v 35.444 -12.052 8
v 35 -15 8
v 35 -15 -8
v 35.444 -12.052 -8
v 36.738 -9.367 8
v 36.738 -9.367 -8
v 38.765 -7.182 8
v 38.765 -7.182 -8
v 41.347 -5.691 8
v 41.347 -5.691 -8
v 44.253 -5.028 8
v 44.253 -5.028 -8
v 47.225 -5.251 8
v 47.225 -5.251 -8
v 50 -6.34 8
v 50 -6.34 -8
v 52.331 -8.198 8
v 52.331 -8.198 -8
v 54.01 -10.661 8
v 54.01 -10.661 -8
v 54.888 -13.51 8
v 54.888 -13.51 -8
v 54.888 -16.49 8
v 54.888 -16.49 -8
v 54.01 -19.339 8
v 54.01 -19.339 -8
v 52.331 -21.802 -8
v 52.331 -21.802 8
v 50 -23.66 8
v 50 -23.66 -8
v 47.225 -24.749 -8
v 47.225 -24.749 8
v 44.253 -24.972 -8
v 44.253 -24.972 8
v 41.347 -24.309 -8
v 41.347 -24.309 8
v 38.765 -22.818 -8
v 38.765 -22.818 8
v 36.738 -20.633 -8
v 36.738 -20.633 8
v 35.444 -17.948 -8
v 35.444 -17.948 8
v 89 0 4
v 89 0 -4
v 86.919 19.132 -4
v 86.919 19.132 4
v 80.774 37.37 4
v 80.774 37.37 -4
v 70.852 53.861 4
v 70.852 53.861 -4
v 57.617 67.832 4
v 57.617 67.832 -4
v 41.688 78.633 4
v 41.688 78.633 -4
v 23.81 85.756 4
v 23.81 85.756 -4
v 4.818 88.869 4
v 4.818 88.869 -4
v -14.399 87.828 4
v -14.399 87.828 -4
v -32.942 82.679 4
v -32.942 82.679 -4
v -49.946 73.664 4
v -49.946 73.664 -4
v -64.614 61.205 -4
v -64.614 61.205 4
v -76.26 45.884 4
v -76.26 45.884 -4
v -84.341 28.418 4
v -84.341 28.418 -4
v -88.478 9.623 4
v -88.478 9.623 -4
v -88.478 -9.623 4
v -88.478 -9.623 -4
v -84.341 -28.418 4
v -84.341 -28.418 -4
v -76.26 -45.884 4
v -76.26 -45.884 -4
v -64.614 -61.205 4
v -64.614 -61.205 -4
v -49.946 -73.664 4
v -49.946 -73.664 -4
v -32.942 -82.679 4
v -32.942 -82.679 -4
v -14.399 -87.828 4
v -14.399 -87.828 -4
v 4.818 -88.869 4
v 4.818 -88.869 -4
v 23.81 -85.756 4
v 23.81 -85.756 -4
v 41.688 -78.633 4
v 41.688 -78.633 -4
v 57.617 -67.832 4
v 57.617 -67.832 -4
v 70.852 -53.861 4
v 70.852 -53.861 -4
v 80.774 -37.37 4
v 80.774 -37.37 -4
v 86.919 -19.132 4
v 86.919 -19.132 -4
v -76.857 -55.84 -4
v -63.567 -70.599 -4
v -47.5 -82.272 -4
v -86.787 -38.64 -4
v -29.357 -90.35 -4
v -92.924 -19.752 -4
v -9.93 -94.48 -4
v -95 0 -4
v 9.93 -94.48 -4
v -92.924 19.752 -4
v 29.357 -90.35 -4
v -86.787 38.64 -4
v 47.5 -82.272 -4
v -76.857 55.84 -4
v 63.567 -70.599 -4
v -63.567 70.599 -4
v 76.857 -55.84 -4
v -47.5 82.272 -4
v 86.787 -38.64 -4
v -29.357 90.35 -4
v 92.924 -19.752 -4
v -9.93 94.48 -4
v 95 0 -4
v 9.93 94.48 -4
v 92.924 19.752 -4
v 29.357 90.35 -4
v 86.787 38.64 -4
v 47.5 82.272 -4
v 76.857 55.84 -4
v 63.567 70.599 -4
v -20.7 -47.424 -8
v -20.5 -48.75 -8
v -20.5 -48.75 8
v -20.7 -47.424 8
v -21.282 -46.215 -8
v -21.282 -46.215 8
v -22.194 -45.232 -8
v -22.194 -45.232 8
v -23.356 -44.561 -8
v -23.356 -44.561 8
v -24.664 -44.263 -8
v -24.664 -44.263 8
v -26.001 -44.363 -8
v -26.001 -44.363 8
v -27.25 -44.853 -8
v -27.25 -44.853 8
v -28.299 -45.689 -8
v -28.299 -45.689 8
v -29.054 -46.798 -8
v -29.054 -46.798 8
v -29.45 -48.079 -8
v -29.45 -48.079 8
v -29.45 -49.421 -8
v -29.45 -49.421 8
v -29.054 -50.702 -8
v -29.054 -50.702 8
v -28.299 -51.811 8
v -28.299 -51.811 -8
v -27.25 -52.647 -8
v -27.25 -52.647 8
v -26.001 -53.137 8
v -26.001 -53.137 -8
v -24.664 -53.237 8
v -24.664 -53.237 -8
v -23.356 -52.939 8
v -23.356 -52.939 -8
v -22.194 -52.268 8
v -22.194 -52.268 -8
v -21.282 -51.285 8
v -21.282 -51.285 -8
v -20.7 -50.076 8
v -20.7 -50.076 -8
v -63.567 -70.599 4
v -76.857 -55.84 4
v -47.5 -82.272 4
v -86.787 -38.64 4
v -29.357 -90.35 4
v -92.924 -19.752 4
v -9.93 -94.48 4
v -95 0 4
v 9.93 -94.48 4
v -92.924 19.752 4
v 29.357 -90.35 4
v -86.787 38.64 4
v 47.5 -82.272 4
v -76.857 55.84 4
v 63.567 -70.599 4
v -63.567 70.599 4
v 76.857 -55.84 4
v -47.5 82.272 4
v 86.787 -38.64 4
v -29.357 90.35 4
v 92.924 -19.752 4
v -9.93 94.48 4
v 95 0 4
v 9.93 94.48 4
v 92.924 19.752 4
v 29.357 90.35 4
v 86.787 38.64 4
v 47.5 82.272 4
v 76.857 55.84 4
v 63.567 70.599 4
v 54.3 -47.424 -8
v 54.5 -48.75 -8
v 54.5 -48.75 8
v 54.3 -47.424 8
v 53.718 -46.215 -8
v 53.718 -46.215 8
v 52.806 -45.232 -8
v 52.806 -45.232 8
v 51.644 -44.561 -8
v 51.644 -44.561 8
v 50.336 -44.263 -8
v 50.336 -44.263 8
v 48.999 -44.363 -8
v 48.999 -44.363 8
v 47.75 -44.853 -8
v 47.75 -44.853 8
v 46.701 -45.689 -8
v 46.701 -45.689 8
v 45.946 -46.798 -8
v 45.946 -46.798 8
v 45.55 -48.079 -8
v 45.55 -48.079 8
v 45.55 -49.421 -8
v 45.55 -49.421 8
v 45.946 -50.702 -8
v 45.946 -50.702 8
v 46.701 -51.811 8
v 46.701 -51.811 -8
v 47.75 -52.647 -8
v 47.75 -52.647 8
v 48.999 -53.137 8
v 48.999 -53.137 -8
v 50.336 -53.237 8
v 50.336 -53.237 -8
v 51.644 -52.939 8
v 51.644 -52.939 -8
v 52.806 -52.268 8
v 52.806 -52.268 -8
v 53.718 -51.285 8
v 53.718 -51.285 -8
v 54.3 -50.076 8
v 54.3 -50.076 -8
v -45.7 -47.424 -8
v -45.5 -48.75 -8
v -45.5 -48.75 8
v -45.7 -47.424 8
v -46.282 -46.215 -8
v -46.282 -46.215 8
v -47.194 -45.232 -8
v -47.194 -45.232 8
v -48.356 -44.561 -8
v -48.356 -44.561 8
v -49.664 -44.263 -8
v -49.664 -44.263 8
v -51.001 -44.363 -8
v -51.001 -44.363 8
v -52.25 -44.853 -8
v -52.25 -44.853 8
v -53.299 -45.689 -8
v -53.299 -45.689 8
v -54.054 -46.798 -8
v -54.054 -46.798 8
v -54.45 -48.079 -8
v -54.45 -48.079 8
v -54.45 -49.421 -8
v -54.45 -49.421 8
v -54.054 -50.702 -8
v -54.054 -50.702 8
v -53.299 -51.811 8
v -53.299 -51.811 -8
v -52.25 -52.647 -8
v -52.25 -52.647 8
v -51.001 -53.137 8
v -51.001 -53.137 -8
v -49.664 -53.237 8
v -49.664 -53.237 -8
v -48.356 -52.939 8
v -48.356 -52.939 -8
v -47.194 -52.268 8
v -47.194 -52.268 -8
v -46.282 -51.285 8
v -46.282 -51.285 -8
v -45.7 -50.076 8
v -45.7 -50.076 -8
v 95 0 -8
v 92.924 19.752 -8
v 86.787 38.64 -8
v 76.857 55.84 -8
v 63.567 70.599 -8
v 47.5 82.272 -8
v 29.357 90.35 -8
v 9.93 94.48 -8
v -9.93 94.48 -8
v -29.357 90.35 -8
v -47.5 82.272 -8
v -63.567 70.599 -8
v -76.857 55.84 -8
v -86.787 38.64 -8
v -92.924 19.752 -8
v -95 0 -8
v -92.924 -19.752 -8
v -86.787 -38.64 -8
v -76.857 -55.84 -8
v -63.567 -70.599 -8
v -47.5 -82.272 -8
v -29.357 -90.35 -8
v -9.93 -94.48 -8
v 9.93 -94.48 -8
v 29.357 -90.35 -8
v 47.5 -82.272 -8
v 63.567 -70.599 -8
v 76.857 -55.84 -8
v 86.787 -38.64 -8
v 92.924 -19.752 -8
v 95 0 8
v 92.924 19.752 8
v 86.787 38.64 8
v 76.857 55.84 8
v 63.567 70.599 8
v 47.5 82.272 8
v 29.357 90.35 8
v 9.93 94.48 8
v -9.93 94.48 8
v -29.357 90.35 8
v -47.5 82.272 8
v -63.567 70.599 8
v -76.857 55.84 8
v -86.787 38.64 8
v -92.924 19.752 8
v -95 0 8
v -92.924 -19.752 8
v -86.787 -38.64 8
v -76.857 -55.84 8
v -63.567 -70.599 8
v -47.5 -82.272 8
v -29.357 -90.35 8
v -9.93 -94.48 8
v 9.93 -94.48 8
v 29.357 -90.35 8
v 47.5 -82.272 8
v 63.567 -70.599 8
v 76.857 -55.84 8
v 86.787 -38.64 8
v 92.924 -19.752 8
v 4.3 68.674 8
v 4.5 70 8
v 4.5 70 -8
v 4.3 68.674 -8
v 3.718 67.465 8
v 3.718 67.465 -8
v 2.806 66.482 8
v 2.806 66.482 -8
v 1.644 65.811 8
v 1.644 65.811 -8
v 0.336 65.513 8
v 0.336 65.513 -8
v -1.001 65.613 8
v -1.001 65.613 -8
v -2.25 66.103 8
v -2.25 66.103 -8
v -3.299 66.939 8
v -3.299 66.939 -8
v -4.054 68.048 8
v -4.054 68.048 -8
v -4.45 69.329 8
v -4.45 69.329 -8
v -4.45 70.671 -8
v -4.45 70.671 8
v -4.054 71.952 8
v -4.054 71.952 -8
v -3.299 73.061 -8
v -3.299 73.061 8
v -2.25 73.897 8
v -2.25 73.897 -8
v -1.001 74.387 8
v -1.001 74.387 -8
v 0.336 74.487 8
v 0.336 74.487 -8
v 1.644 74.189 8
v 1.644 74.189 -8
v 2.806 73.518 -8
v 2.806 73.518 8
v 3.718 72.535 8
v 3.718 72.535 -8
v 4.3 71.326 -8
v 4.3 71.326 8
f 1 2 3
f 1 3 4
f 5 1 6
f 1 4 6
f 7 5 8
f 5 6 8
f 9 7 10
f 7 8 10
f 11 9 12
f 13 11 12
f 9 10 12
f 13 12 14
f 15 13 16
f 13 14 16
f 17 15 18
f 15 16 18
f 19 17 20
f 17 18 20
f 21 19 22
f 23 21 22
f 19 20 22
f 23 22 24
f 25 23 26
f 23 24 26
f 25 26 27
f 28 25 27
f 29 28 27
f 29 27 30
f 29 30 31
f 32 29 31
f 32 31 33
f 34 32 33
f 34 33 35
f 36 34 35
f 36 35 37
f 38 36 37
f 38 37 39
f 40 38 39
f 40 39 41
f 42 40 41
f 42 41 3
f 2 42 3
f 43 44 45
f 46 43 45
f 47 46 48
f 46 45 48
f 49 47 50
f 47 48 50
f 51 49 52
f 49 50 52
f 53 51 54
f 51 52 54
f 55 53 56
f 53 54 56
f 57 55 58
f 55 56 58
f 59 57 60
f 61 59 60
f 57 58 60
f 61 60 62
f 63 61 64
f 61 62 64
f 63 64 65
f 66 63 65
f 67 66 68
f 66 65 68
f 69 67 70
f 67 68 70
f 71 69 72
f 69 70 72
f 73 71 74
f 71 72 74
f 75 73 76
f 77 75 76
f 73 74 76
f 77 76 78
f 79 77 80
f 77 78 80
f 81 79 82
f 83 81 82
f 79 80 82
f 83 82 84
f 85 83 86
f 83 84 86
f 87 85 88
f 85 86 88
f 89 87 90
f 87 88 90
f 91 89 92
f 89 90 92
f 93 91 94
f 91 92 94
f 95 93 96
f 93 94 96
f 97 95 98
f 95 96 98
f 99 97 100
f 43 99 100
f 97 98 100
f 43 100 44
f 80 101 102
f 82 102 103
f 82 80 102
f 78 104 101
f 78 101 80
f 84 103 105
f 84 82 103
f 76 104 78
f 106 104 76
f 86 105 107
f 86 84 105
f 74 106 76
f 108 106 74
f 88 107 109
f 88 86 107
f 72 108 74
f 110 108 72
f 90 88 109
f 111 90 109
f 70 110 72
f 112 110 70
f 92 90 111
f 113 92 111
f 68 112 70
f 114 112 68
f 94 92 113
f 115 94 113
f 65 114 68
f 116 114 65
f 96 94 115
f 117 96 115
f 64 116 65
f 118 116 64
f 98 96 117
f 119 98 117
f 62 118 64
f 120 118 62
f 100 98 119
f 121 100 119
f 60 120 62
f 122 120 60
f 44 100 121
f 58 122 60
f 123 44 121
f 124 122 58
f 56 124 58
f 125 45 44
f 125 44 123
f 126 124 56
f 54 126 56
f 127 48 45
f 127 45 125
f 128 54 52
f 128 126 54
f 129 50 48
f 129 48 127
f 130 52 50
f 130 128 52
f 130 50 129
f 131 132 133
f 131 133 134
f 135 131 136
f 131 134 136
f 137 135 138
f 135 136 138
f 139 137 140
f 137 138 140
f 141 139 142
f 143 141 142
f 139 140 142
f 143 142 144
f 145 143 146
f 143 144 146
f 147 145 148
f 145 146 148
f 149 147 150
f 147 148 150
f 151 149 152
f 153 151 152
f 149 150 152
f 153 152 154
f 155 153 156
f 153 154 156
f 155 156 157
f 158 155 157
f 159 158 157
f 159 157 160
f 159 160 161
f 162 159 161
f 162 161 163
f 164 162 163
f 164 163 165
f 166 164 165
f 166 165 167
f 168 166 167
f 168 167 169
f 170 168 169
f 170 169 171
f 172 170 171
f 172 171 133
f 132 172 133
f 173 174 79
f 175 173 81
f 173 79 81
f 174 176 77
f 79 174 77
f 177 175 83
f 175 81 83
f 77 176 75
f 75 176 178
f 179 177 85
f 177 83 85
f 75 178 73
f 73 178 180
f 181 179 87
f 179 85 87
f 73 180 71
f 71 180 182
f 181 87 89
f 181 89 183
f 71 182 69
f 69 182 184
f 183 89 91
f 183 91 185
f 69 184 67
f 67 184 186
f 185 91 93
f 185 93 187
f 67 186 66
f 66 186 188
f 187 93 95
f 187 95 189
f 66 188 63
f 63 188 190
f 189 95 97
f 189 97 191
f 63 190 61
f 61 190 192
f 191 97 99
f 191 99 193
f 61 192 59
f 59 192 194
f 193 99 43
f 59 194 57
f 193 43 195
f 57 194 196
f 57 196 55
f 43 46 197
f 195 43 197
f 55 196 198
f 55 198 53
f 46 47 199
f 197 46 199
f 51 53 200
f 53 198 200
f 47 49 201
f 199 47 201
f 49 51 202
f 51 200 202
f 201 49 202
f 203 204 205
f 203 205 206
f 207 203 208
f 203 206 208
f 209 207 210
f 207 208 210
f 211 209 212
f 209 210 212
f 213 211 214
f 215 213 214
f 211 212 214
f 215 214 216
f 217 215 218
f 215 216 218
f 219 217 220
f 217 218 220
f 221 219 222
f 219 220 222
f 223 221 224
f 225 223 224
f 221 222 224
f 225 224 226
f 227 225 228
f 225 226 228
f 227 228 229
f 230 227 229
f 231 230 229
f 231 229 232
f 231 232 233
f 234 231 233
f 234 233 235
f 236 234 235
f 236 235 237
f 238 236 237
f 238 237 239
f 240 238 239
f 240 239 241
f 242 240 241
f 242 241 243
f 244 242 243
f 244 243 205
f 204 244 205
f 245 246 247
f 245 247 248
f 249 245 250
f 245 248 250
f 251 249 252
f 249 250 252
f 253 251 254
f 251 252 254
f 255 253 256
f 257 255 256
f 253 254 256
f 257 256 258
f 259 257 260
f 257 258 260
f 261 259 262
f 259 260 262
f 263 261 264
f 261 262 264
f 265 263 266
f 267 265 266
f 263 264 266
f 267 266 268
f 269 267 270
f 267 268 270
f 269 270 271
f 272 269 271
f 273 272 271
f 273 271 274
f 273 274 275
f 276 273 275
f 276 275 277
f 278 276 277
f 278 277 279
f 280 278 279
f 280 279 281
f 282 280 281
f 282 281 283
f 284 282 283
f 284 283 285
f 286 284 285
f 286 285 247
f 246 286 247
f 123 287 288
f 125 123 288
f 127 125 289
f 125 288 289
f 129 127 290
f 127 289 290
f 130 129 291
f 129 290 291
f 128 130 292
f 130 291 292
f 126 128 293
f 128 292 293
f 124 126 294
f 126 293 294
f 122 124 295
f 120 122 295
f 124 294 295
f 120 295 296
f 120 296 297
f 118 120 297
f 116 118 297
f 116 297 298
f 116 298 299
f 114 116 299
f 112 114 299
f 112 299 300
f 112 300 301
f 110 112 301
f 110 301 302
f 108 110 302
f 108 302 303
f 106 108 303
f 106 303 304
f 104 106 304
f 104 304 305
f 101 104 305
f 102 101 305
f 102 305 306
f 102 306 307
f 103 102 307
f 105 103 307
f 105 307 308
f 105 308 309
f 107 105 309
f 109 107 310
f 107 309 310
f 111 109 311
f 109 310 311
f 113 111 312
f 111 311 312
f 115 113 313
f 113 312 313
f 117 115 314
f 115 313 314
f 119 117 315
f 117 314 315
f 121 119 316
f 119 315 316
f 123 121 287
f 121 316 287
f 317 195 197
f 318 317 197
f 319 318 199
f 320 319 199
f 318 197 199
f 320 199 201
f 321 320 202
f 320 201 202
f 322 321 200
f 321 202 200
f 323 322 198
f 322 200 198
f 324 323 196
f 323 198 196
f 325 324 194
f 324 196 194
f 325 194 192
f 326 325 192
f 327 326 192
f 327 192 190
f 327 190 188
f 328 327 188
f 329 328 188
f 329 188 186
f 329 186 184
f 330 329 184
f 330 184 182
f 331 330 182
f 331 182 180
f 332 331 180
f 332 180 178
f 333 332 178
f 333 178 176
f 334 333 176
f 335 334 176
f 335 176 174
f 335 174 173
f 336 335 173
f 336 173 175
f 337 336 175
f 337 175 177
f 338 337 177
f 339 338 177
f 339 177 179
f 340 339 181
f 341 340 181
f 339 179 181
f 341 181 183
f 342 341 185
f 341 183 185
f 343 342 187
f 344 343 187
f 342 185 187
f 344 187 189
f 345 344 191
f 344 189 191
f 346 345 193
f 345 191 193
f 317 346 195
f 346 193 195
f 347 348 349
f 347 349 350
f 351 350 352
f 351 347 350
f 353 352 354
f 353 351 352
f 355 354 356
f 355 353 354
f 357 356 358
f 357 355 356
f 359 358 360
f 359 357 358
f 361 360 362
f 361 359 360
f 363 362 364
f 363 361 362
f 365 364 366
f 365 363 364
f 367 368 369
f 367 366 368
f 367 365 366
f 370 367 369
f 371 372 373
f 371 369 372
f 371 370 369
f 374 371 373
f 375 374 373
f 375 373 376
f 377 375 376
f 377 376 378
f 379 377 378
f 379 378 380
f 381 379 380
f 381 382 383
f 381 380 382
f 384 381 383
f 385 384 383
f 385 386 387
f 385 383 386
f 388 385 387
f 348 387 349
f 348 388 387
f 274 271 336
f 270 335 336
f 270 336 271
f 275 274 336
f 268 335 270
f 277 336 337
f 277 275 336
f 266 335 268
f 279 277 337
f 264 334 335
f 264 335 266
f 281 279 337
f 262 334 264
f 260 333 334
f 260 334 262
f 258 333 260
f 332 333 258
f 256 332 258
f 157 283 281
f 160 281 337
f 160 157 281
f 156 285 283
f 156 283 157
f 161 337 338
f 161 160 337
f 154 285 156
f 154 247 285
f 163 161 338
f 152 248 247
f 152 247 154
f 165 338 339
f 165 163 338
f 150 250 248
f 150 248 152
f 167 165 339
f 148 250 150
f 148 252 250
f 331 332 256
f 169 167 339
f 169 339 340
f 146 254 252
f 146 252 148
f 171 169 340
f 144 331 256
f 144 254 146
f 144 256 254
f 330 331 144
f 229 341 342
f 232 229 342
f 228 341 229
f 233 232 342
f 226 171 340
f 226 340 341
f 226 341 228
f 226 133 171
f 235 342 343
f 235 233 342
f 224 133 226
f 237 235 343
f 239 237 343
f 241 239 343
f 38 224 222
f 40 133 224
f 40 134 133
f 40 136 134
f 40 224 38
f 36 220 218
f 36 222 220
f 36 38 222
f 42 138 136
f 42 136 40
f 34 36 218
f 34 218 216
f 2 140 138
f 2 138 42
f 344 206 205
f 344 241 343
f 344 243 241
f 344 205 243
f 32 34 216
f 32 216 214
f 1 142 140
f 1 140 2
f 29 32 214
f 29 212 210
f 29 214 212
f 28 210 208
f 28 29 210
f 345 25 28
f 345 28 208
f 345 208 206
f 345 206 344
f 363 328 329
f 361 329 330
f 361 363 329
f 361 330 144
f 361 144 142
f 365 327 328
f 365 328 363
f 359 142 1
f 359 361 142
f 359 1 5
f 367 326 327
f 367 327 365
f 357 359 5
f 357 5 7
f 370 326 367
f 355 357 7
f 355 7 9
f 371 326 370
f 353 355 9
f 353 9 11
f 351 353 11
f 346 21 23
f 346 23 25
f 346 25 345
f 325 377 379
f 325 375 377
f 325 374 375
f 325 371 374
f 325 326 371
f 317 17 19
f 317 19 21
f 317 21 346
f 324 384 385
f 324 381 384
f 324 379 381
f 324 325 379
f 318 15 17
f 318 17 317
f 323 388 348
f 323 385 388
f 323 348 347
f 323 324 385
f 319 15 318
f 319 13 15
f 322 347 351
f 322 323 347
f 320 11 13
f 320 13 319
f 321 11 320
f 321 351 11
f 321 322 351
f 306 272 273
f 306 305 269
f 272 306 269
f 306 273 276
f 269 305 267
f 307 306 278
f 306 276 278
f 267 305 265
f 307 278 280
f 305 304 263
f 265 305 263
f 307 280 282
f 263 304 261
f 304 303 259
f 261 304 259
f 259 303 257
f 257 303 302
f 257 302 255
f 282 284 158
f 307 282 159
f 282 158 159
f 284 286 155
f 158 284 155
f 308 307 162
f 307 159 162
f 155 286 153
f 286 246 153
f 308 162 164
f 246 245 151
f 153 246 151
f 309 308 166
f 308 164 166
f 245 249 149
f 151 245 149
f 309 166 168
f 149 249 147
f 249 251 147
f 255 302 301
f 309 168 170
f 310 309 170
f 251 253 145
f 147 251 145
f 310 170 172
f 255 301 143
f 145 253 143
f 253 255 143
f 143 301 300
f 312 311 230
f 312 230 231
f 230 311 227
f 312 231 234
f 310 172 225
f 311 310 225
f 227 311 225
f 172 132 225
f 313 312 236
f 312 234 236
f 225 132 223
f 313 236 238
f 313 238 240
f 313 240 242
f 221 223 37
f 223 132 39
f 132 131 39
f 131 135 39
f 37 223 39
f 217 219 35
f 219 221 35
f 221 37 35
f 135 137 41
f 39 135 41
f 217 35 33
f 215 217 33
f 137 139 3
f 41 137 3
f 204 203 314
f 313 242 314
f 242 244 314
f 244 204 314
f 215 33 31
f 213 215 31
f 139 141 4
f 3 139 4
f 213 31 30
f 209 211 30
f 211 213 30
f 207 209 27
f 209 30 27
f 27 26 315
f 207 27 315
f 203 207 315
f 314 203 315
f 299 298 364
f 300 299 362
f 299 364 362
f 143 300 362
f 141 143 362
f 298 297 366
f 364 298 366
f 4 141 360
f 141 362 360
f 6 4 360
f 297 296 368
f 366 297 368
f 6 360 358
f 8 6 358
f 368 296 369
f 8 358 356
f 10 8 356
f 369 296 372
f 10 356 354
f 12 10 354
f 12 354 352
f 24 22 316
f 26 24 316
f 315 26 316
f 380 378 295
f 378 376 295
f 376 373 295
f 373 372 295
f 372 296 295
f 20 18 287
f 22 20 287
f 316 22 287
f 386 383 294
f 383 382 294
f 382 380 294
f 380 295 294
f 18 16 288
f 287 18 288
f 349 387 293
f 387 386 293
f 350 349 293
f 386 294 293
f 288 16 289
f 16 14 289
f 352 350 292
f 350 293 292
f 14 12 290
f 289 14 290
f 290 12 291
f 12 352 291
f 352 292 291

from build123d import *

# Parameters (mm, degrees)
BOSS_EXTRUDE1_DEPTH      = 8
BOSS_EXTRUDE1_DEPTH_BACK = 8
SKETCH2_R                = 95
CUT_EXTRUDE1_DEPTH       = 4
CUT_EXTRUDE1_DEPTH_BACK  = 4
SKETCH2_5_R              = 95
SKETCH2_5_R_2            = 89
SKETCH7_R                = 4.5
CUT_EXTRUDE2_DEPTH       = 167
CUT_EXTRUDE4_DEPTH       = 112
CUT_EXTRUDE4_DEPTH_BACK  = 60
SKETCH10_R               = 4.5
SKETCH11_R               = 10
CUT_EXTRUDE5_DEPTH       = 60


with BuildPart() as part:
    # Sketch2 → Boss-Extrude1 (new, two sides: drawn at the far end of the back side and taken through both)
    with BuildSketch(Plane.XY.offset(-BOSS_EXTRUDE1_DEPTH_BACK)):
        Circle(SKETCH2_R)
    extrude(amount=BOSS_EXTRUDE1_DEPTH + BOSS_EXTRUDE1_DEPTH_BACK)

    # Sketch2<5> → Cut-Extrude1 (cut, two sides: drawn at the far end of the back side and taken through both)
    with BuildSketch(Plane.XY.offset(-CUT_EXTRUDE1_DEPTH_BACK)):
        Circle(SKETCH2_5_R)
        Circle(SKETCH2_5_R_2, mode=Mode.SUBTRACT)
    extrude(amount=CUT_EXTRUDE1_DEPTH + CUT_EXTRUDE1_DEPTH_BACK, mode=Mode.SUBTRACT)

    # Sketch7 → Cut-Extrude2 (cut)
    with BuildSketch(Plane.XY.offset(8)):
        with Locations((-50, -48.75)):
            Circle(SKETCH7_R)
        with Locations((50, -48.75)):
            Circle(SKETCH7_R)
        with Locations((-25, -48.75)):
            Circle(SKETCH7_R)
    extrude(amount=-CUT_EXTRUDE2_DEPTH, mode=Mode.SUBTRACT)

    # Sketch10 → Cut-Extrude4 (cut, two sides: drawn at the far end of the back side and taken through both)
    with BuildSketch(Plane(origin=(0, 0, -8), x_dir=(-1, 0, 0), z_dir=(0, 0, -1)).offset(-CUT_EXTRUDE4_DEPTH_BACK)):
        with Locations((0, 70)):
            Circle(SKETCH10_R)
    extrude(amount=CUT_EXTRUDE4_DEPTH + CUT_EXTRUDE4_DEPTH_BACK, mode=Mode.SUBTRACT)

    # Sketch11 → Cut-Extrude5 (cut)
    with BuildSketch(Plane(origin=(0, 0, -8), x_dir=(-1, 0, 0), z_dir=(0, 0, -1))):
        with Locations((-45, -15)):
            Circle(SKETCH11_R)
    extrude(amount=-CUT_EXTRUDE5_DEPTH, mode=Mode.SUBTRACT)


solid = part.part
